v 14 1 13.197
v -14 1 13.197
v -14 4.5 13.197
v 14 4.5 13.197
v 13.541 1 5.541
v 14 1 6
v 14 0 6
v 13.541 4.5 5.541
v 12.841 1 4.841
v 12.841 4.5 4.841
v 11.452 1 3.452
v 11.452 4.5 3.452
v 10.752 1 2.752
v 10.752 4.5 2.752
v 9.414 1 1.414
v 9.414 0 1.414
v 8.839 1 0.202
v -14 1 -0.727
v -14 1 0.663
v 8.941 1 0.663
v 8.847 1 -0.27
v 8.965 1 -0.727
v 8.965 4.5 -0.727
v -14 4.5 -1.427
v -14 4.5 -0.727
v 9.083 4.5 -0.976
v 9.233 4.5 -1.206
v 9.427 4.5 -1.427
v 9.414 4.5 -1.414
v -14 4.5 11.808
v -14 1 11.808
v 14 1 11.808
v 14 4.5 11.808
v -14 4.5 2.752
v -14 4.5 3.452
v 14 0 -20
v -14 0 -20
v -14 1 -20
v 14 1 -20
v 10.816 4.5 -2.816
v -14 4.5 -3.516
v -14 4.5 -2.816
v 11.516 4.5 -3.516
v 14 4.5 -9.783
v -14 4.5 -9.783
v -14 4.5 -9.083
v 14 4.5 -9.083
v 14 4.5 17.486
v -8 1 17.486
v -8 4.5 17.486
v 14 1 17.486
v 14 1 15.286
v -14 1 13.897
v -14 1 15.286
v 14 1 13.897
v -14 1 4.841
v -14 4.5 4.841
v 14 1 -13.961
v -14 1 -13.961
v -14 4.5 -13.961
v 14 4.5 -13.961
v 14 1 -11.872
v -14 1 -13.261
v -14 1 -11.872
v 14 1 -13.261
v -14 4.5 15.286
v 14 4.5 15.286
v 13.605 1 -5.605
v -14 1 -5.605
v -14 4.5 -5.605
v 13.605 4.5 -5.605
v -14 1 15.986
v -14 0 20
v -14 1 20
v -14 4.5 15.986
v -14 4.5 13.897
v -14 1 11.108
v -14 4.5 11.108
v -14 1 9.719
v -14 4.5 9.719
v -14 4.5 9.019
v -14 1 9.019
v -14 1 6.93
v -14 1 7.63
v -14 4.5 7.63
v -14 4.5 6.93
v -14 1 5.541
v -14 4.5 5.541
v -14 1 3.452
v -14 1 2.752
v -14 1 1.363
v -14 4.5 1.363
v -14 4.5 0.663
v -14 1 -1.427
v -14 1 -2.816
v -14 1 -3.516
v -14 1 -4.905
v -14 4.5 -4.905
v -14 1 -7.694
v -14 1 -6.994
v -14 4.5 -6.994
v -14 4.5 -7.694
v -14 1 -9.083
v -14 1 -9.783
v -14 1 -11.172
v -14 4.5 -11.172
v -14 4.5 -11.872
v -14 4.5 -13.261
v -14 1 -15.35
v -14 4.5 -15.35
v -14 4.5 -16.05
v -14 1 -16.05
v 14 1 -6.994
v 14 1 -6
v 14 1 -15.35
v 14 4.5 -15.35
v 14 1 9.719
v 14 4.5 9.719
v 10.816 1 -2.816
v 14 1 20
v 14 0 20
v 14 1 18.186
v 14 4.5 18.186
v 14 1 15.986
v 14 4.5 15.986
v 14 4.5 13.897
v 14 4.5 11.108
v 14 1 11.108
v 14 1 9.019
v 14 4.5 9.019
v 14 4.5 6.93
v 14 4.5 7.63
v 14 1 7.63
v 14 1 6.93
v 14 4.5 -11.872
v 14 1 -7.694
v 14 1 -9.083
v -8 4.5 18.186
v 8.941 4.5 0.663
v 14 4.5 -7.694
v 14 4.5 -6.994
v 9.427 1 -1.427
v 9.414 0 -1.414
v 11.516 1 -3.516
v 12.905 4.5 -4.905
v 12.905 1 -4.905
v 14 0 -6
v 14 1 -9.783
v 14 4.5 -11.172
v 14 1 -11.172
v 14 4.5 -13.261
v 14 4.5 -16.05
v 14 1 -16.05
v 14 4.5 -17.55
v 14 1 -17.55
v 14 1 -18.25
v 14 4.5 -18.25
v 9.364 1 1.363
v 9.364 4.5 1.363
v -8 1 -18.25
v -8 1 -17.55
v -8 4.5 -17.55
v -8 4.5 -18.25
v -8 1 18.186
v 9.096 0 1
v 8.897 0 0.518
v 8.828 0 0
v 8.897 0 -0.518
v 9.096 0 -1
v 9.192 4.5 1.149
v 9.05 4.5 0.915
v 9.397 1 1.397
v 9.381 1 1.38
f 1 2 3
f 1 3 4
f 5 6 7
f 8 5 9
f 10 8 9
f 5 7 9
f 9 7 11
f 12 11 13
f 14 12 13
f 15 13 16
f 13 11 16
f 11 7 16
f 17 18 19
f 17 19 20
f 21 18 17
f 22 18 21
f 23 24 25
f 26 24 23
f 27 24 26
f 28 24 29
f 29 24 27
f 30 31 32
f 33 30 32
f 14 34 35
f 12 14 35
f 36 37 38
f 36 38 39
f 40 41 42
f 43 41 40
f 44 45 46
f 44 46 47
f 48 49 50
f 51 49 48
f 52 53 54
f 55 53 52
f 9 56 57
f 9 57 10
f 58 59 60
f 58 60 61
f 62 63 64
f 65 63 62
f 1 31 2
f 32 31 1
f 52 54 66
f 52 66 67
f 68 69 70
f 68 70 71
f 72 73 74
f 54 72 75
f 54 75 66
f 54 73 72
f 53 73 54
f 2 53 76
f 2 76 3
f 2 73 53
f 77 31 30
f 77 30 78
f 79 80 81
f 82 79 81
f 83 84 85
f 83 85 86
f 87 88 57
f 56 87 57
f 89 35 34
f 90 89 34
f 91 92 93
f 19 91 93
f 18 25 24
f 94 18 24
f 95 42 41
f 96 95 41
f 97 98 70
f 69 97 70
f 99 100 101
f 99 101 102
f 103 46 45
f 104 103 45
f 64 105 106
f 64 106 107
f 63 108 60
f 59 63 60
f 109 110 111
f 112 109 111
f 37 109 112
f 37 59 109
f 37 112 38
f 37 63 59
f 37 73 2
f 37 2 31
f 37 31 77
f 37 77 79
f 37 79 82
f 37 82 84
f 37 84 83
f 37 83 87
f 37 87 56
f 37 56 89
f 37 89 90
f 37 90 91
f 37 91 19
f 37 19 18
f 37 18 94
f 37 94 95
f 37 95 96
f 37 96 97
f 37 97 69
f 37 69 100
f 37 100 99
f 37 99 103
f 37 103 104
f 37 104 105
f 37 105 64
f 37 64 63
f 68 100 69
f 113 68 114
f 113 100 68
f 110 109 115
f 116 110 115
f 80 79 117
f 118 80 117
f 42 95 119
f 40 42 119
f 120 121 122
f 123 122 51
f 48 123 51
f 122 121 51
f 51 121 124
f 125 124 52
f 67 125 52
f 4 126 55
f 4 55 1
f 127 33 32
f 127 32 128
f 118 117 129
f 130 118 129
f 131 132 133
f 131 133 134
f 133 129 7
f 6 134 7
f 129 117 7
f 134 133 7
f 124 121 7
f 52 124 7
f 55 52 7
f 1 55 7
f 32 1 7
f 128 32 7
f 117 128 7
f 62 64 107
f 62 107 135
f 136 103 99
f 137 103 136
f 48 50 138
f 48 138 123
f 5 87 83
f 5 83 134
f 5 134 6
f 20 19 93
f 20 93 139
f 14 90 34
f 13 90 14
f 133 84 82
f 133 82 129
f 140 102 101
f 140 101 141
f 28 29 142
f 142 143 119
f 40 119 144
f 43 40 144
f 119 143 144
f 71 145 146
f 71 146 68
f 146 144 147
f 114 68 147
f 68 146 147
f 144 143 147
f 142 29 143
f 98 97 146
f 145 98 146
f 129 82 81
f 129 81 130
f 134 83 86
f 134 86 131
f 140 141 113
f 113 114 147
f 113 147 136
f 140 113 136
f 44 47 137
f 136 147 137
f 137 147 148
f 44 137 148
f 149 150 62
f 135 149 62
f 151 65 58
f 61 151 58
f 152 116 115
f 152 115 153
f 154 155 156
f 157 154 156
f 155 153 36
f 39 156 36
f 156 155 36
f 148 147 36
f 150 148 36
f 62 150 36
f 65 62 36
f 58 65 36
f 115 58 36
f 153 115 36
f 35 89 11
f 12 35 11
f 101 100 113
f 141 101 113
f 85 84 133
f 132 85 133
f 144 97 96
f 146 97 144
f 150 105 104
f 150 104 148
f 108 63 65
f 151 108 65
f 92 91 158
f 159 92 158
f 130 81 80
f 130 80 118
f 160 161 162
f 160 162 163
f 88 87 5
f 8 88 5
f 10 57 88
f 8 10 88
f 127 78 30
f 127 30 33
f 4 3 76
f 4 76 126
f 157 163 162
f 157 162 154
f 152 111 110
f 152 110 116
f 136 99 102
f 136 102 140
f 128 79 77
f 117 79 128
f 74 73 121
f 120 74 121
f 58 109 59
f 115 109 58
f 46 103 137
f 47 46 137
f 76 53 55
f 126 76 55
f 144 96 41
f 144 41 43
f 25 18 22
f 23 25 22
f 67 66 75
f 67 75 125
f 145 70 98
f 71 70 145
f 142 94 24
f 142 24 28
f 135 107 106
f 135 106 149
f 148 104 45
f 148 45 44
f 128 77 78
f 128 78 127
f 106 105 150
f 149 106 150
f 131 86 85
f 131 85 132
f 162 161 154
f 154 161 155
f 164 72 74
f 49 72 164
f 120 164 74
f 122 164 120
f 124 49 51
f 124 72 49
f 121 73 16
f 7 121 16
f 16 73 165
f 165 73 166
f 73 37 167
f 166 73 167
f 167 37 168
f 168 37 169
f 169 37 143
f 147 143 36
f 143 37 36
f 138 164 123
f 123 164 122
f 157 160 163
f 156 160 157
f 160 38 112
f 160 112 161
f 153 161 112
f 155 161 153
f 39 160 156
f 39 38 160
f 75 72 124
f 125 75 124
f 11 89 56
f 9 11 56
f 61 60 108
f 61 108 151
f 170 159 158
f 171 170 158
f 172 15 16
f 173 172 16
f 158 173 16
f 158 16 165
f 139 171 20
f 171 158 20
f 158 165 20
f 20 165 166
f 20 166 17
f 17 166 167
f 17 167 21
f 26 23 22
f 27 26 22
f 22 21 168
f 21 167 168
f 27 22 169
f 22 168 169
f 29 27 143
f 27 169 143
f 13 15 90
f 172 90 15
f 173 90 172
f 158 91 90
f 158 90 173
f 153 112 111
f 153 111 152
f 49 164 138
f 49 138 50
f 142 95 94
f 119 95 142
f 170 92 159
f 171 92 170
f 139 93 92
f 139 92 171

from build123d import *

# Parameters (mm, degrees)
SKETCH_1_W          = 28
SKETCH_1_H          = 40
EXTRUDE_1_DEPTH     = 1
SKETCH_2_W          = 28
SKETCH_2_H          = 0.7
SKETCH_2_W_2        = 22
EXTRUDE_2_DEPTH     = 3.5
CUT_EXTRUDE_1_DEPTH = 25.824383175


with BuildPart() as part:
    # 草图1 → 凸台-拉伸1 (new body)
    with BuildSketch(Plane(origin=(0, 0, 0), x_dir=(1, 0, 0), z_dir=(0, 1, 0))):
        Rectangle(SKETCH_1_W, SKETCH_1_H)
    extrude(amount=EXTRUDE_1_DEPTH)

    # 草图2 → 凸台-拉伸2 (add)
    with BuildSketch(Plane(origin=(0, 1, 0), x_dir=(1, 0, 0), z_dir=(0, 1, 0))):
        with Locations((0, 15.7)):
            Rectangle(SKETCH_2_W, SKETCH_2_H)
        with Locations((0, 13.610934911)):
            Rectangle(SKETCH_2_W, SKETCH_2_H)
        with Locations((0, 11.521869822)):
            Rectangle(SKETCH_2_W, SKETCH_2_H)
        with Locations((0, 9.432804734)):
            Rectangle(SKETCH_2_W, SKETCH_2_H)
        with Locations((0, 7.343739645)):
            Rectangle(SKETCH_2_W, SKETCH_2_H)
        with Locations((0, 5.254674556)):
            Rectangle(SKETCH_2_W, SKETCH_2_H)
        with Locations((0, 3.165609467)):
            Rectangle(SKETCH_2_W, SKETCH_2_H)
        with Locations((0, 1.076544379)):
            Rectangle(SKETCH_2_W, SKETCH_2_H)
        with Locations((0, -1.01252071)):
            Rectangle(SKETCH_2_W, SKETCH_2_H)
        with Locations((0, -3.101585799)):
            Rectangle(SKETCH_2_W, SKETCH_2_H)
        with Locations((0, -5.190650888)):
            Rectangle(SKETCH_2_W, SKETCH_2_H)
        with Locations((0, -7.279715977)):
            Rectangle(SKETCH_2_W, SKETCH_2_H)
        with Locations((0, -9.368781065)):
            Rectangle(SKETCH_2_W, SKETCH_2_H)
        with Locations((0, -11.457846154)):
            Rectangle(SKETCH_2_W, SKETCH_2_H)
        with Locations((0, -13.546911243)):
            Rectangle(SKETCH_2_W, SKETCH_2_H)
        with Locations((0, -15.635976332)):
            Rectangle(SKETCH_2_W, SKETCH_2_H)
        with Locations((3, 17.9)):
            Rectangle(SKETCH_2_W_2, SKETCH_2_H)
        with Locations((3, -17.835976332)):
            Rectangle(SKETCH_2_W_2, SKETCH_2_H)
    extrude(amount=EXTRUDE_2_DEPTH)

    # 草图4 → 切除-拉伸1 (cut, through all)
    with BuildSketch(Plane.XZ):
        with BuildLine():
            Line((9.414213562, -1.414213562), (14, -6))
            Line((14, -6), (14, 6))
            Line((14, 6), (9.414213551, 1.414213551))
            ThreePointArc((9.414213551, 1.414213551), (8.828427125, -8e-09), (9.414213562, -1.414213562))
        make_face()
    extrude(amount=-CUT_EXTRUDE_1_DEPTH, mode=Mode.SUBTRACT)


solid = part.part
